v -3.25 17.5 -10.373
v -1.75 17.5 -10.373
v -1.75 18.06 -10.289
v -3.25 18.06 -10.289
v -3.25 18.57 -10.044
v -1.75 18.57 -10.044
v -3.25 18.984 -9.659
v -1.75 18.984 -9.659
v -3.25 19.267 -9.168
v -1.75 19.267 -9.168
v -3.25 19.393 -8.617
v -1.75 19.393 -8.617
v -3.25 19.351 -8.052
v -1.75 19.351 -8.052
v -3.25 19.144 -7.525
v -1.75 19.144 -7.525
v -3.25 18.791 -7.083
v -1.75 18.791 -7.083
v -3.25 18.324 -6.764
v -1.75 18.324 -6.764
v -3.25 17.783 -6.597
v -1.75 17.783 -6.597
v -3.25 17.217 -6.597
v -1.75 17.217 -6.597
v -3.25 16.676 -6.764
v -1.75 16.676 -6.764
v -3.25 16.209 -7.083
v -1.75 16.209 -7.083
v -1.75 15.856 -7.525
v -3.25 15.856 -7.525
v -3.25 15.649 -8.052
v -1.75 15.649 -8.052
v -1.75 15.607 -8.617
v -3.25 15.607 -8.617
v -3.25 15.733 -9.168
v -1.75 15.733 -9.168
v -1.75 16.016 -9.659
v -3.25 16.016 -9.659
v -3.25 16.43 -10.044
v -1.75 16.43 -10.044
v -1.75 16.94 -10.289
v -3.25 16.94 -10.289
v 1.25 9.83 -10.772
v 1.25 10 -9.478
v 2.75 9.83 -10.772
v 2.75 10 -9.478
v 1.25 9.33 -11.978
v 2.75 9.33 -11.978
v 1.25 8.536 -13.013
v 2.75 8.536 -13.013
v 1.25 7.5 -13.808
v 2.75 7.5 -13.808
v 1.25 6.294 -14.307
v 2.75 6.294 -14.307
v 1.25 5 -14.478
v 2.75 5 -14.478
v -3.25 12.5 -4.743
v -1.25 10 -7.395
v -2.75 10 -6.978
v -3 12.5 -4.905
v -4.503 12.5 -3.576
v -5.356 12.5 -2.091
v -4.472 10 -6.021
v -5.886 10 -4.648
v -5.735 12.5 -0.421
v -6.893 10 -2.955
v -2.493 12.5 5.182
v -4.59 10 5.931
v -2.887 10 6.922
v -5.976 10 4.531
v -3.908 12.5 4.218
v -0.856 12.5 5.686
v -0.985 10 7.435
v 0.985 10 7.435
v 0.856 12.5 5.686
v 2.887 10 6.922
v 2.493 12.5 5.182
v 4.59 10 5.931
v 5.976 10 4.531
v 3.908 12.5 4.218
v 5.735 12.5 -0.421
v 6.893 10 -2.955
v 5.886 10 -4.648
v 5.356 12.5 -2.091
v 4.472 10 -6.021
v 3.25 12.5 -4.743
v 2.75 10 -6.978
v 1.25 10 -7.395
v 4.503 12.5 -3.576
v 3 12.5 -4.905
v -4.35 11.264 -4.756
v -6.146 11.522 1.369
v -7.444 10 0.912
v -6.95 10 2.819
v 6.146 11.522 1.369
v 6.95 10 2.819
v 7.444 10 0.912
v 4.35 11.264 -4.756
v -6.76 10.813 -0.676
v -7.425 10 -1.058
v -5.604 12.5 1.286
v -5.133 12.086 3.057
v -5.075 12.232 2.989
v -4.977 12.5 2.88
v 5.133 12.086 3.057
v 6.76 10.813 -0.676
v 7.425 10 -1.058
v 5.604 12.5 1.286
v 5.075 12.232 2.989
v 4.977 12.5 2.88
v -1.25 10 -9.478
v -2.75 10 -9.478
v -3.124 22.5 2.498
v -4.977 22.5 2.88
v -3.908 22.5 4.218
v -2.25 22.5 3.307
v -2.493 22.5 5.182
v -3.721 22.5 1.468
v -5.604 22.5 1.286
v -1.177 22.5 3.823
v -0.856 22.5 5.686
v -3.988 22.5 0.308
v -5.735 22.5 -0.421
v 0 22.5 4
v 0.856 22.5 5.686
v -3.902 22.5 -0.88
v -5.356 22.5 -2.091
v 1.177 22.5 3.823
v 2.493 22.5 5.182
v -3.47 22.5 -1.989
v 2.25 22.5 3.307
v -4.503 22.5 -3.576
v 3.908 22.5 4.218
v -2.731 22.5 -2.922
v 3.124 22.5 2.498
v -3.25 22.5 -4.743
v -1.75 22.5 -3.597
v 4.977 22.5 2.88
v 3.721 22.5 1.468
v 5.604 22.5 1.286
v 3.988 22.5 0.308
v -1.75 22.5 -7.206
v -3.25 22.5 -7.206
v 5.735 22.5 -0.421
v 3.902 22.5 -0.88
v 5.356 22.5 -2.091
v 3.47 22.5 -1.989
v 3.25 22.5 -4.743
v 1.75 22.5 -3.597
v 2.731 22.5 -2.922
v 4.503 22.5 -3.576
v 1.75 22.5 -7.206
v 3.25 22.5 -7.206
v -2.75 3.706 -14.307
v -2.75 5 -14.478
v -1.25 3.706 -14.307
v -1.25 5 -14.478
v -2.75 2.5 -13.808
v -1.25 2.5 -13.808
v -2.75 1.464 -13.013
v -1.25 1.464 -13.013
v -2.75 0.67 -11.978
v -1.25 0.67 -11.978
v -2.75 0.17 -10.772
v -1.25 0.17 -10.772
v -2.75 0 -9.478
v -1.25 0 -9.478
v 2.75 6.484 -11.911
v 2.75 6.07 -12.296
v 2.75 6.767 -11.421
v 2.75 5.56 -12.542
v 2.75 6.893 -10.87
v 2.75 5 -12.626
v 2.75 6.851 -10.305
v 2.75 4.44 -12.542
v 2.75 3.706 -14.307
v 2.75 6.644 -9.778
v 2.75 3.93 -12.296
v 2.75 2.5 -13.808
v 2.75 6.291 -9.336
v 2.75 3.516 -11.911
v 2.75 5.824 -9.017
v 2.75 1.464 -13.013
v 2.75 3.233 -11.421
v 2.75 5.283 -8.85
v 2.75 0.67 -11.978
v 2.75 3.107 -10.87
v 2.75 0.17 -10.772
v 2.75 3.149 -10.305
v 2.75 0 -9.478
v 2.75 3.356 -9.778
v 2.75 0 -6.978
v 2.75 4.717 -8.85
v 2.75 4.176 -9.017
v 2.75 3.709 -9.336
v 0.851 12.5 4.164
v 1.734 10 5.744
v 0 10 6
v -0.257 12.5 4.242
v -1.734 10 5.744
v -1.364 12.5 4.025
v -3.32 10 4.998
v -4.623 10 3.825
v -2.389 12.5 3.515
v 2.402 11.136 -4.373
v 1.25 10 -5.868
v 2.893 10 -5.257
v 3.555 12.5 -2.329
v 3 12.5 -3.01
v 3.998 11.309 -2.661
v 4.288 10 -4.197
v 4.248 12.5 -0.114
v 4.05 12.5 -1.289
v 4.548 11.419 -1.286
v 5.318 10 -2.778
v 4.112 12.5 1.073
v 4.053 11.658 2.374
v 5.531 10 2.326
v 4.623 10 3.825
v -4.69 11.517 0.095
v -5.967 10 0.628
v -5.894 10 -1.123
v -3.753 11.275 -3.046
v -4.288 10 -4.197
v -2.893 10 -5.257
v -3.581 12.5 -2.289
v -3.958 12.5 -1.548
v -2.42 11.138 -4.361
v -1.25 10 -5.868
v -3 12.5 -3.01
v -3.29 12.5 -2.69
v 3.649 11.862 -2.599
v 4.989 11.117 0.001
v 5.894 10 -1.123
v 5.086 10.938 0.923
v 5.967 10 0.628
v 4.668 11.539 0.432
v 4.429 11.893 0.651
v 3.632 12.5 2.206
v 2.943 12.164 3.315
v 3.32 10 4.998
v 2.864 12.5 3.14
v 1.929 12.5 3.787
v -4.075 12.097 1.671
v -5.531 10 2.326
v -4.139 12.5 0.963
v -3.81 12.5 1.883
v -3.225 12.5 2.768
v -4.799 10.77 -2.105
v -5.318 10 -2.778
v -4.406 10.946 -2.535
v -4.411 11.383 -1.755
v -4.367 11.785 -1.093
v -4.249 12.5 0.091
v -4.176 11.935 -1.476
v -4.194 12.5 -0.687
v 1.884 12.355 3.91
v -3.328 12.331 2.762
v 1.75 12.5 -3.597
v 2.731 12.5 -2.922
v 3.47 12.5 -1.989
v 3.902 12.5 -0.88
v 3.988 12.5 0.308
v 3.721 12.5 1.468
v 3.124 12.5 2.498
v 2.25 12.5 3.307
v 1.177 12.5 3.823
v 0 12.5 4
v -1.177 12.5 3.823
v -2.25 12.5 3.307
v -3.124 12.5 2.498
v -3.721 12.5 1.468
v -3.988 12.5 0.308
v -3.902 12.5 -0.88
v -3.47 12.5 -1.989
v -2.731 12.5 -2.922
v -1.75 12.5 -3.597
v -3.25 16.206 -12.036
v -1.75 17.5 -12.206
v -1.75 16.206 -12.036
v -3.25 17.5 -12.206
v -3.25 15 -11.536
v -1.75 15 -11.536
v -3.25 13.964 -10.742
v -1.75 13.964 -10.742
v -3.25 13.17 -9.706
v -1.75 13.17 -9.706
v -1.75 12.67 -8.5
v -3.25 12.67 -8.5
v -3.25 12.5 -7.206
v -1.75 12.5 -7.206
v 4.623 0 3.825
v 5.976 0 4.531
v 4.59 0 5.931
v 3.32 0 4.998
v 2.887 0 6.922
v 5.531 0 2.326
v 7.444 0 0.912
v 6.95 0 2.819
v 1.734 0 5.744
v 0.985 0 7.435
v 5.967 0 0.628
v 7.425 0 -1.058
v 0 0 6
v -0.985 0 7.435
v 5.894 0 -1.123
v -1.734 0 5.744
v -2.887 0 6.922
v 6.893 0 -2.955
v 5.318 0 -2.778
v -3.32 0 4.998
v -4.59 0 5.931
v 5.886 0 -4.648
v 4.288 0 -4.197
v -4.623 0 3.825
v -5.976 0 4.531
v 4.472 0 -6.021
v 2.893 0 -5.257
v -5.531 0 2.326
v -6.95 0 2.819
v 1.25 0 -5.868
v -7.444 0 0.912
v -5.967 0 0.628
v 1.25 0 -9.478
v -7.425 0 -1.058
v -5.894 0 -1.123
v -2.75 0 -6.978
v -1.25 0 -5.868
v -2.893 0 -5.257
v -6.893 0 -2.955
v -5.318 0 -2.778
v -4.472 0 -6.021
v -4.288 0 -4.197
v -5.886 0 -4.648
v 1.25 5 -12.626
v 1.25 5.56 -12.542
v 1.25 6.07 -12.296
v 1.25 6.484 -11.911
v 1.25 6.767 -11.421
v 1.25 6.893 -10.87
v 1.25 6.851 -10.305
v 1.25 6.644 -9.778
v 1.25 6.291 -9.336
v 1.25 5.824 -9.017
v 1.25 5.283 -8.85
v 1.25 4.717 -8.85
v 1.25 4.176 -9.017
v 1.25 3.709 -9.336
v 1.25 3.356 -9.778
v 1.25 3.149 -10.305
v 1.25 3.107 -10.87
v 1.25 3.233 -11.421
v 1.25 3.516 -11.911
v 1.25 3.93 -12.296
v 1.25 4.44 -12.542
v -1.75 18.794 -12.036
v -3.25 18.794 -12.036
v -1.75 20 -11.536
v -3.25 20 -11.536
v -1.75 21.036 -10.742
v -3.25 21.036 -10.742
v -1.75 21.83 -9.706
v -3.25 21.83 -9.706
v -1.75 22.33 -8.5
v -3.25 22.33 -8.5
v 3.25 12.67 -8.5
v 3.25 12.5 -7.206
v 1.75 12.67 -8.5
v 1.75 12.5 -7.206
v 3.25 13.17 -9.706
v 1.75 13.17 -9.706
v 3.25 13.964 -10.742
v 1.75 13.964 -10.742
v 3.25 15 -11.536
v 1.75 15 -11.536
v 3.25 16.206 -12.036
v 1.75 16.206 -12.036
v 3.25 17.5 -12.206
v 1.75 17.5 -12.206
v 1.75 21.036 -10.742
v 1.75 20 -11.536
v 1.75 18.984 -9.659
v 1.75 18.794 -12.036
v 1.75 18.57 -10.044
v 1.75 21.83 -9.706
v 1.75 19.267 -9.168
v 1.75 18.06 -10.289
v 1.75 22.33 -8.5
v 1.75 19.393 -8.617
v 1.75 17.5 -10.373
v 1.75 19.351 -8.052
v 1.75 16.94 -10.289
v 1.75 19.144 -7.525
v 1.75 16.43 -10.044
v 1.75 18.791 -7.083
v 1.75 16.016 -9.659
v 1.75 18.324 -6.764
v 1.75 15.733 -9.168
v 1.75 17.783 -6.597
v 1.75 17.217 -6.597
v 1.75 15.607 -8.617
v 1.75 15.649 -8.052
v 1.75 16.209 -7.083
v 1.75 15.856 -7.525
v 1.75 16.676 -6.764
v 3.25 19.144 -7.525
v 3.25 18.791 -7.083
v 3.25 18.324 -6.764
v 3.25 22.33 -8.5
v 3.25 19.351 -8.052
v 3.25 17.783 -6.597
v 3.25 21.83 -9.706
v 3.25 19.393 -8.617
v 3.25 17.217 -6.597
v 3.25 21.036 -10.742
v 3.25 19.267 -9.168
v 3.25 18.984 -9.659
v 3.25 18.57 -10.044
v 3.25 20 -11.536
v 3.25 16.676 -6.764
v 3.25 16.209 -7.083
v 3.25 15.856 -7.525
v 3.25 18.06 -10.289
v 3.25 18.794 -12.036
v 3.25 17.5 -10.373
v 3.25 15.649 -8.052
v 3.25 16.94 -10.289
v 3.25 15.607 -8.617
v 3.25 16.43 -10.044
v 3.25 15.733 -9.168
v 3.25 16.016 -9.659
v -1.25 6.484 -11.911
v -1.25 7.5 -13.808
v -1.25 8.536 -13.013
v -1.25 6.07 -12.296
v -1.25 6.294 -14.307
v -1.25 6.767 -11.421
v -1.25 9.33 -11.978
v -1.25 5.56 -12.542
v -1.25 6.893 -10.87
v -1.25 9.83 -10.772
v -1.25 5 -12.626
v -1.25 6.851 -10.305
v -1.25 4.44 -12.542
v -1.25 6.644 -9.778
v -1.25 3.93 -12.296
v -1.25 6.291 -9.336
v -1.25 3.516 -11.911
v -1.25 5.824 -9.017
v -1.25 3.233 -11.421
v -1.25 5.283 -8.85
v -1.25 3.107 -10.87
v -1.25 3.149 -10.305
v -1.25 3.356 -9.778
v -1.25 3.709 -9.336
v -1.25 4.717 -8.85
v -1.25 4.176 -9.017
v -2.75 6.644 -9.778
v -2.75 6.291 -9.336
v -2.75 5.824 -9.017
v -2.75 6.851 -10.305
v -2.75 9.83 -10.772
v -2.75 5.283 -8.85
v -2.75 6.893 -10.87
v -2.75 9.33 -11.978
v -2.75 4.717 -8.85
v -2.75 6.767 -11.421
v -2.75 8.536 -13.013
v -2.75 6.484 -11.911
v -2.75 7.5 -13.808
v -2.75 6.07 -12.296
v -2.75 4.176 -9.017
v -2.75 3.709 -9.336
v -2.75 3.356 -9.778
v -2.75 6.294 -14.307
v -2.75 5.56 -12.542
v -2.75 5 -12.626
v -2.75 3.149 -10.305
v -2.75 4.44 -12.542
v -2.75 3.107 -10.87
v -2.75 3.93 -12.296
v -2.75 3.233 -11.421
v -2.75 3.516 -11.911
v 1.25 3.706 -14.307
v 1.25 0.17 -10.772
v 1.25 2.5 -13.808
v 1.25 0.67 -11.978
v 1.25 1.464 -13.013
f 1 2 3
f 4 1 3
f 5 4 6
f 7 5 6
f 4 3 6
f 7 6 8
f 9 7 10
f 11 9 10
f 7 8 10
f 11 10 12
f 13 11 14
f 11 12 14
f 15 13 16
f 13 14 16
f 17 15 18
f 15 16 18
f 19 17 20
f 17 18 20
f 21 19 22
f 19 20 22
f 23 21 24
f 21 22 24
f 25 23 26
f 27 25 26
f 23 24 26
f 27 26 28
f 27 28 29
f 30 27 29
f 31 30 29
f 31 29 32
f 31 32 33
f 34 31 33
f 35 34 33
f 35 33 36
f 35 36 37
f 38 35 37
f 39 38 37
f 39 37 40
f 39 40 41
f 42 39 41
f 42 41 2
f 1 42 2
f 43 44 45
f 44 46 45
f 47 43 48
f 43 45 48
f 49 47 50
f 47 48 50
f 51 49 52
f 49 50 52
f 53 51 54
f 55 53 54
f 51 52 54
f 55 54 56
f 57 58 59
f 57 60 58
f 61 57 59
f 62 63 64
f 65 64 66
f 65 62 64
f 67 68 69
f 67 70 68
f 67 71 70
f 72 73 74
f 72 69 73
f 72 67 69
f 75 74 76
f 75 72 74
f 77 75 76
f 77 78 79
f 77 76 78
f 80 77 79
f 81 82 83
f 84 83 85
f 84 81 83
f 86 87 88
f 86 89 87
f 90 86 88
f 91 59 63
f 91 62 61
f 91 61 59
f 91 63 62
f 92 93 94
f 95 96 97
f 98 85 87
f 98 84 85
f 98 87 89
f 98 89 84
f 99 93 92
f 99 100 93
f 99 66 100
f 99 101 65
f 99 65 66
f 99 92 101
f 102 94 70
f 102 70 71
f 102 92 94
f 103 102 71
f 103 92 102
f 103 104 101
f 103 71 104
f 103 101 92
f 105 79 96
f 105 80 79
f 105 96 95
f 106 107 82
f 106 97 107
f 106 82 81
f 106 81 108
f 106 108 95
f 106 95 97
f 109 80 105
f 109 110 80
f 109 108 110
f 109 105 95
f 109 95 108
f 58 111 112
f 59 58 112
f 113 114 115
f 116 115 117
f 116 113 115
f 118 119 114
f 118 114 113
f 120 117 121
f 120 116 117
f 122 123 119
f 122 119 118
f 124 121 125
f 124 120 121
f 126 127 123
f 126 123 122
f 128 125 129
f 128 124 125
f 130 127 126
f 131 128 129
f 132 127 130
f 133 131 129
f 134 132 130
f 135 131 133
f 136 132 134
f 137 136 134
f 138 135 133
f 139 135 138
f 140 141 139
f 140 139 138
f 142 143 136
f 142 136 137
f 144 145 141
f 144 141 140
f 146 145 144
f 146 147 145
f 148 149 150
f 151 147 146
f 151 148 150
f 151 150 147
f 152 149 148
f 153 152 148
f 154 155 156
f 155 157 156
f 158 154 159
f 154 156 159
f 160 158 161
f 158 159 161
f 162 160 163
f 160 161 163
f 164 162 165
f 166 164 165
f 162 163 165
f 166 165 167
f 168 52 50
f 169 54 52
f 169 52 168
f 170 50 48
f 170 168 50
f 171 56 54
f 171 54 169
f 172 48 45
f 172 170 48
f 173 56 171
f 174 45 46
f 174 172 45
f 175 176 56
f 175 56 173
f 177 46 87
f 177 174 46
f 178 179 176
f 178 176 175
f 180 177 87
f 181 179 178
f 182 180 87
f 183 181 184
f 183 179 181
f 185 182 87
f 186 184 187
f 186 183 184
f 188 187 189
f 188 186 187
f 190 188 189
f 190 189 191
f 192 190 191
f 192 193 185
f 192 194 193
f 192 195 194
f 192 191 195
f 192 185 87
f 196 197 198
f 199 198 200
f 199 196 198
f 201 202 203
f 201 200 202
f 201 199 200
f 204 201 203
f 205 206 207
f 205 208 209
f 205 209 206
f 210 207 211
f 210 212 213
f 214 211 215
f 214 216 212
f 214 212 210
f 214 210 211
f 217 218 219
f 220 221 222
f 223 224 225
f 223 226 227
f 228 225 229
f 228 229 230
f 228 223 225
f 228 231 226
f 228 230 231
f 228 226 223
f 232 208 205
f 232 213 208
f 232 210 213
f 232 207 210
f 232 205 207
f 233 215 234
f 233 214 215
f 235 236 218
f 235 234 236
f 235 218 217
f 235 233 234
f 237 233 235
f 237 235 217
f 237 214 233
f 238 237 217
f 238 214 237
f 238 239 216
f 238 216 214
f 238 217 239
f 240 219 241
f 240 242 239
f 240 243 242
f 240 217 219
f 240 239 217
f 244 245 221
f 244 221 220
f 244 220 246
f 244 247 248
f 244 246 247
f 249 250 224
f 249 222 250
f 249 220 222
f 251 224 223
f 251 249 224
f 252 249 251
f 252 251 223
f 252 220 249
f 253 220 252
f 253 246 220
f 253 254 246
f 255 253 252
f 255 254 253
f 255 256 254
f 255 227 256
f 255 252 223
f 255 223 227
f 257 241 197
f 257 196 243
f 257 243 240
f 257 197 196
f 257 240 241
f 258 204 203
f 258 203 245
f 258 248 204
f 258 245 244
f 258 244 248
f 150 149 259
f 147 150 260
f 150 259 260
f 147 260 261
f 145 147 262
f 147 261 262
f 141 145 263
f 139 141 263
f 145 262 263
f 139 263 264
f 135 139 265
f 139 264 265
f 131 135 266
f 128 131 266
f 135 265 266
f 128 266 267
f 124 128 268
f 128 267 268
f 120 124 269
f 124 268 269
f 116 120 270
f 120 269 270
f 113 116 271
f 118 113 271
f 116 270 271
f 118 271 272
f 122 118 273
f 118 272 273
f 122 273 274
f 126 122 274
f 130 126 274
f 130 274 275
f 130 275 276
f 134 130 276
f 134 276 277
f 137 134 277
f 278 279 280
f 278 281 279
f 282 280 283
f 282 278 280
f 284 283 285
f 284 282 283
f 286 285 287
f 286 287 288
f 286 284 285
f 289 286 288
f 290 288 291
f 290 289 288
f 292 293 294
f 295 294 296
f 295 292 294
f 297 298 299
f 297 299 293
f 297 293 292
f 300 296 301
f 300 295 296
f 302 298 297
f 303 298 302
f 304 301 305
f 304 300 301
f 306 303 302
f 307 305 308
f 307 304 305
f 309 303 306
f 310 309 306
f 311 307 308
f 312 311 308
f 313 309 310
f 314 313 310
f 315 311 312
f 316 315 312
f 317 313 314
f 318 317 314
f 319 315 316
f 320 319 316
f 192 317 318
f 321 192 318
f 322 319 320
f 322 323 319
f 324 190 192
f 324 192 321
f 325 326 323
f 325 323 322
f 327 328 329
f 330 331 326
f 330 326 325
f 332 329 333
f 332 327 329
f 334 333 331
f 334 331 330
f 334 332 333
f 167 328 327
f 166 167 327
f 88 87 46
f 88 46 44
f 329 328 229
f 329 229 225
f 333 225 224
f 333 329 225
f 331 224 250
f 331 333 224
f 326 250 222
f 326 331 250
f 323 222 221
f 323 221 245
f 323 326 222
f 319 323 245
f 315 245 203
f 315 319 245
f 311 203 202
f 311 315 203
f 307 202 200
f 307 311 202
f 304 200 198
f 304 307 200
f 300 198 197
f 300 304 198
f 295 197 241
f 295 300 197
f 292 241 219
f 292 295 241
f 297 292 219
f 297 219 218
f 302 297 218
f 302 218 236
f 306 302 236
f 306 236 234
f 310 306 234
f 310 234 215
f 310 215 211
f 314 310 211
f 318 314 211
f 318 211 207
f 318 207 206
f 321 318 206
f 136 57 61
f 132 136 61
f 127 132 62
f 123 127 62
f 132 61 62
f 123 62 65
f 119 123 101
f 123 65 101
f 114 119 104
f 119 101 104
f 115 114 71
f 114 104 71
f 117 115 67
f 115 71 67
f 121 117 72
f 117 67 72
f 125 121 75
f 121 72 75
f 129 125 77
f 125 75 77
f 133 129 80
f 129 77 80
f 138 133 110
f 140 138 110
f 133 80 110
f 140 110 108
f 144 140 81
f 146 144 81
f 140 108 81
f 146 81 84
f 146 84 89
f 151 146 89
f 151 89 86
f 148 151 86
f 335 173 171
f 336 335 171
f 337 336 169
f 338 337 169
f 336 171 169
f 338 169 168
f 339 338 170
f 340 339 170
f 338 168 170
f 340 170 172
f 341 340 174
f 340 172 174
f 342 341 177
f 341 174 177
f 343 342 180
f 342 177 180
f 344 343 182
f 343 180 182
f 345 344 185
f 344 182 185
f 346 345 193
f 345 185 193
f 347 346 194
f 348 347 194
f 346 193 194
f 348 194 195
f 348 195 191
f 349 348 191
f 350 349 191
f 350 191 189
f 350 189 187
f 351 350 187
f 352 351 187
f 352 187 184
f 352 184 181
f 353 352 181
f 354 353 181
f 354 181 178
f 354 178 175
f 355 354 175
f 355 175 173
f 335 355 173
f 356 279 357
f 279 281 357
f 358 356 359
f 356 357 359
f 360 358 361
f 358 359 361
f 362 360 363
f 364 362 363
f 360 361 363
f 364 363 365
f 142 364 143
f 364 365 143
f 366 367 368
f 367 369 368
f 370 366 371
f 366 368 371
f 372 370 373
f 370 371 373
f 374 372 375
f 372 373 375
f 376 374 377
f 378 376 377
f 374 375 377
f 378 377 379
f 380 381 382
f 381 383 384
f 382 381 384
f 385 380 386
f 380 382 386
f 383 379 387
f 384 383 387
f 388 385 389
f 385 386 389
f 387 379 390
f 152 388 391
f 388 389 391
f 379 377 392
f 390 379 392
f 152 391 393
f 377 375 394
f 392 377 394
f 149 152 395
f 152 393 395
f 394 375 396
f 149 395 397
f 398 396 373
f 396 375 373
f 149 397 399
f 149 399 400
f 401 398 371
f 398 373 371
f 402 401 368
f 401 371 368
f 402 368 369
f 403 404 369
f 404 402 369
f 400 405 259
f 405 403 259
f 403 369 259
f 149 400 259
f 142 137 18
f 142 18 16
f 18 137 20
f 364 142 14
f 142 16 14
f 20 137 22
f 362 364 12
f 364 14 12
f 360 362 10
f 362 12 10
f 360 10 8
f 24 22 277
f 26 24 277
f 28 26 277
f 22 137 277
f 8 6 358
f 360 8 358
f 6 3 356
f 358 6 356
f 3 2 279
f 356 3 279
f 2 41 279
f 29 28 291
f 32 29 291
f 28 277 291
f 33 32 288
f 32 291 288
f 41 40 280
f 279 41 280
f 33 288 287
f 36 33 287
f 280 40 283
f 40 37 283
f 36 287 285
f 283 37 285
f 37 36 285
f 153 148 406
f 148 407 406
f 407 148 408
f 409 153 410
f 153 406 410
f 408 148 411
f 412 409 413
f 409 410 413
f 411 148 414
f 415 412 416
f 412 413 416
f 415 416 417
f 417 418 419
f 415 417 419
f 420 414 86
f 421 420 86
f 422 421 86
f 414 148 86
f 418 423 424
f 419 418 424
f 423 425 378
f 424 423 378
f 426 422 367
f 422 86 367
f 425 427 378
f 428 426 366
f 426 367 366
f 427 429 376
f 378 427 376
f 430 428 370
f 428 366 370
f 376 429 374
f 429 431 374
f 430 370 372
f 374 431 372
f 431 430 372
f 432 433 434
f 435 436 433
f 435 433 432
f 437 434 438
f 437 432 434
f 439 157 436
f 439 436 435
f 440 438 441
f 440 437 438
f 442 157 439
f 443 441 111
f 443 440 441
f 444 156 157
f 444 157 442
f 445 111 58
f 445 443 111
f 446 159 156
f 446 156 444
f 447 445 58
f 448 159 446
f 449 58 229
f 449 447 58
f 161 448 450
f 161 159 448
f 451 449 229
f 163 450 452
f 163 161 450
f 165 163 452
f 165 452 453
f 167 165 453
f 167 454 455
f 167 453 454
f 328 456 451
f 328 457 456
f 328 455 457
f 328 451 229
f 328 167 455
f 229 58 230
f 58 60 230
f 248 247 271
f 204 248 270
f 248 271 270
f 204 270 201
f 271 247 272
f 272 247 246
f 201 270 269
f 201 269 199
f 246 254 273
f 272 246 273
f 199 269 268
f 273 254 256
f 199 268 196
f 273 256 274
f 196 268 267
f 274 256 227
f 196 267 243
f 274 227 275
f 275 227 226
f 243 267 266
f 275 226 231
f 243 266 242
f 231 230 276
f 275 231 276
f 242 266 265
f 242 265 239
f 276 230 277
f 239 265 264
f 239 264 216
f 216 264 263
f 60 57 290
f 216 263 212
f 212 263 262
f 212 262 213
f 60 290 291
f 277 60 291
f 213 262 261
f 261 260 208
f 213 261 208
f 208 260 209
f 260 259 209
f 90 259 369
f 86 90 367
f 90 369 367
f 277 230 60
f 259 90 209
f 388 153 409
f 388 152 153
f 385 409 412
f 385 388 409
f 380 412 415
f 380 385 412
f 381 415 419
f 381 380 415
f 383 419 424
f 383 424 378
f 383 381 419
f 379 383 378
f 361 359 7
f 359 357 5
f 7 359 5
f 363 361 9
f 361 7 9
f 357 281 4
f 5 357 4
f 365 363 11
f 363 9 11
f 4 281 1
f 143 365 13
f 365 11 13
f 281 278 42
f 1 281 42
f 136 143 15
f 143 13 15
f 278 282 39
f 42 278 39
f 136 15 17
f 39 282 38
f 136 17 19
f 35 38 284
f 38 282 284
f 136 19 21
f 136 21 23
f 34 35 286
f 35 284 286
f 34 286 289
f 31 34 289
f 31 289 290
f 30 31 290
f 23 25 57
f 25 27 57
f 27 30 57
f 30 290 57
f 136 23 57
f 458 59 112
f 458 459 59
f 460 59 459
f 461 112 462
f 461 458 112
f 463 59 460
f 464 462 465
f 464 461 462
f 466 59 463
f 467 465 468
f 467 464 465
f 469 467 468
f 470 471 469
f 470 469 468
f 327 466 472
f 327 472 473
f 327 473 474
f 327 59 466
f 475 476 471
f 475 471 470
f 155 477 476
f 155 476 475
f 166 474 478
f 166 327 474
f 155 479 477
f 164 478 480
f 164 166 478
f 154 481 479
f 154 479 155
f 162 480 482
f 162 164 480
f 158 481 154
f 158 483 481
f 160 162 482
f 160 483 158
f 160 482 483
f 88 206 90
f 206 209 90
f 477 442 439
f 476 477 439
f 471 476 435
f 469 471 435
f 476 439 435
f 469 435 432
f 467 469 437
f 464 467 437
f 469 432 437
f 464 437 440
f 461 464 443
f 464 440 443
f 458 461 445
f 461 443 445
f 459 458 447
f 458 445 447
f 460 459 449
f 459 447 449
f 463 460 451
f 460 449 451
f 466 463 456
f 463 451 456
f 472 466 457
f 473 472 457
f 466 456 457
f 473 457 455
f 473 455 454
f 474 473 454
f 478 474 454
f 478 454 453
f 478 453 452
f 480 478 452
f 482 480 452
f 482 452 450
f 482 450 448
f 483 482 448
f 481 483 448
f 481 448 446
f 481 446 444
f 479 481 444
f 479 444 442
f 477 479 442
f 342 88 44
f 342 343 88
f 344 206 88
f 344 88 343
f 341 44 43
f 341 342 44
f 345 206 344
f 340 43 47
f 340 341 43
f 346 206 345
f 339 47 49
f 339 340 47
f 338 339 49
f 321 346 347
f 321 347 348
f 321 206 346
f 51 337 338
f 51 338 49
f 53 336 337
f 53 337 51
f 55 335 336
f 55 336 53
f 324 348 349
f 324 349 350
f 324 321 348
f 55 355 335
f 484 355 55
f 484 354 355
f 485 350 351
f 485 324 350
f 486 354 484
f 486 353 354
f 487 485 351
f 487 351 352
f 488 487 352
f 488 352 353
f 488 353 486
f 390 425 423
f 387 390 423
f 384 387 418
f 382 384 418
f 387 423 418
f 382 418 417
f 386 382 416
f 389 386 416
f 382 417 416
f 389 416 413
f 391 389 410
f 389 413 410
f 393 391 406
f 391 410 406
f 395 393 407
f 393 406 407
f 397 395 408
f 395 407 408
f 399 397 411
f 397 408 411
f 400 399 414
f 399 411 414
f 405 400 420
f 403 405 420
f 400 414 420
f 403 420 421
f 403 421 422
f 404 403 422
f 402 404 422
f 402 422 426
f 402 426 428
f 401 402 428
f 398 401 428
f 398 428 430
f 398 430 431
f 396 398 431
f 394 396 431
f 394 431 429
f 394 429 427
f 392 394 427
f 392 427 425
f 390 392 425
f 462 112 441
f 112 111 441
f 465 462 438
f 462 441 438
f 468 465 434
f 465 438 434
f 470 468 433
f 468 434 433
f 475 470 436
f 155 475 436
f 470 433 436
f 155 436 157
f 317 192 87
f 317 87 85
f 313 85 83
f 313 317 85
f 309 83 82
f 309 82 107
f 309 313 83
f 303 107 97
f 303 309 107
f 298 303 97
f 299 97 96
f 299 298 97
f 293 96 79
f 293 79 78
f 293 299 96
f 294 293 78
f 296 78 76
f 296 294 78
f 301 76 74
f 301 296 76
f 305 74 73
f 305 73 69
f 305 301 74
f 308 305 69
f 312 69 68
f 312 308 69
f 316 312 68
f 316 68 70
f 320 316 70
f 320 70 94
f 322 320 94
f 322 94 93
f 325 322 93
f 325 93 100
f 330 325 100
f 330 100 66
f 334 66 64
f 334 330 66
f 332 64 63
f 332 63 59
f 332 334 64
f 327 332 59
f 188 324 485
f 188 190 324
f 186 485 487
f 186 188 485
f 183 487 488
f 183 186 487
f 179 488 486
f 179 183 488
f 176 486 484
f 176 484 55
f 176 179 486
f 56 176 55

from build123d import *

# Parameters (mm, degrees)
BOSS_EXTRUDE1_DEPTH   = 10
BOSS_EXTRUDE2_DEPTH   = 10
F_6_CLEARANCE_HOLE1_D = 3.7973
F_6_CLEARANCE_HOLE2_D = 3.7973
FILLET1_R             = 5


with BuildPart() as part:
    # Sketch1 → Boss-Extrude1 (new body)
    with BuildSketch(Plane(origin=(0, 0, 0), x_dir=(1, 0, 0), z_dir=(0, 1, 0))):
        with BuildLine():
            Line((-1.25, 14.477642868), (-1.25, 5.868347297))
            ThreePointArc((-1.25, 5.868347297), (0, -6), (1.25, 5.868347297))
            Line((1.25, 5.868347297), (1.25, 14.477642868))
            Line((1.25, 14.477642868), (2.75, 14.477642868))
            Line((2.75, 14.477642868), (2.75, 6.977642868))
            ThreePointArc((2.75, 6.977642868), (0, -7.5), (-2.75, 6.977642868))
            Line((-2.75, 6.977642868), (-2.75, 14.477642868))
            Line((-2.75, 14.477642868), (-1.25, 14.477642868))
        make_face()
    extrude(amount=BOSS_EXTRUDE1_DEPTH)

    # Loft1: read off the stored shape, not the designer's step
    # Loft1: loft between two sections, ruled curve by curve
    loft1_from = [
        Edge.make_bspline([(1.25, 10, -5.868347297), (10.900494926, 10, -3.812722767), (9.866997746, 10, 6), (-9.866997746, 10, 6), (-10.900494926, 10, -3.812722767), (-1.25, 10, -5.868347297)], [0, 0, 0, 0, 0.5, 0.5, 1, 1, 1, 1], 3, [1, 0.162539502, 0.065529731, 0.065529731, 0.162539502, 1]),
        Edge.make_bspline([(-1.25, 10, -7.395099729), (-13.876567029, 10, -5.260820359), (-12.805676217, 10, 7.5), (12.805676217, 10, 7.5), (13.876567029, 10, -5.260820359), (1.25, 10, -7.395099729)], [0, 0, 0, 0, 0.5, 0.5, 1, 1, 1, 1], 3, [1, 0.151386494, 0.058902089, 0.058902089, 0.151386494, 1]),
        Edge.make_line((-1.25, 10, -7.395099729), (-1.25, 10, -5.868347297)),
        Edge.make_line((1.25, 10, -5.868347297), (1.25, 10, -7.395099729)),
    ]
    loft1_to = [
        Edge.make_bspline([(3, 12.5, -3.010398645), (6.15488313, 12.5, 0.133586757), (4.453979318, 12.5, 4.25), (-4.453979318, 12.5, 4.25), (-6.15488313, 12.5, 0.133586757), (-3, 12.5, -3.010398645)], [0, 0, 0, 0, 0.5, 0.5, 1, 1, 1, 1], 3, [1, 0.345653128, 0.203217328, 0.203217328, 0.345653128, 1]),
        Edge.make_bspline([(-3, 12.5, -4.905354218), (-9.124128689, 12.5, -1.159980234), (-7.178633469, 12.5, 5.75), (7.178633469, 12.5, 5.75), (9.124128689, 12.5, -1.159980234), (3, 12.5, -4.905354218)], [0, 0, 0, 0, 0.5, 0.5, 1, 1, 1, 1], 3, [1, 0.264204167, 0.135803041, 0.135803041, 0.264204167, 1]),
        Edge.make_line((-3, 12.5, -4.905354218), (-3, 12.5, -3.010398645)),
        Edge.make_line((3, 12.5, -3.010398645), (3, 12.5, -4.905354218)),
    ]
    loft1 = Solid(Shell([*[Face.make_surface_from_curves(loft1_from[k], loft1_to[k]) for k in range(4)], Face(Wire(loft1_from)), Face(Wire(loft1_to))]))
    add(loft1)

    # Sketch4 → Boss-Extrude2 (add)
    with BuildSketch(Plane(origin=(0, 12.5, 0), x_dir=(1, 0, 0), z_dir=(0, 1, 0))):
        with BuildLine():
            Line((-1.75, 5.123626074), (-1.75, 12.206169214))
            Line((-1.75, 12.206169214), (-3.25, 12.206169214))
            Line((-3.25, 12.206169214), (-3.25, 4.74341649))
            ThreePointArc((-3.25, 4.74341649), (0, -5.75), (3.25, 4.74341649))
            Line((3.25, 4.74341649), (3.25, 12.206169214))
            Line((3.25, 12.206169214), (1.75, 12.206169214))
            Line((1.75, 12.206169214), (1.75, 5.123626074))
            Line((1.75, 5.123626074), (1.75, 3.596873642))
            ThreePointArc((1.75, 3.596873642), (0, -4), (-1.75, 3.596873642))
            Line((-1.75, 3.596873642), (-1.75, 5.123626074))
        make_face()
    extrude(amount=BOSS_EXTRUDE2_DEPTH)

    # #6 Clearance Hole1 (through all)
    with Locations(Plane.ZY.offset(2.75)):
        with Locations((-10.727642082, 5)):
            Hole(F_6_CLEARANCE_HOLE1_D / 2)

    # #6 Clearance Hole2 (through all)
    with Locations(Plane.ZY.offset(3.25)):
        with Locations((-8.474792852, 17.5)):
            Hole(F_6_CLEARANCE_HOLE2_D / 2)

    # Fillet1
    fillet1_edges = [part.edges().sort_by_distance(p)[0] for p in [
        (2, 0, -14.477642868),
        (-2, 0, -14.477642868),
        (-2.5, 12.5, -12.206169214),
        (2.5, 12.5, -12.206169214),
        (-2.5, 22.5, -12.206169214),
        (2.5, 22.5, -12.206169214),
        (2, 10, -14.477642868),
        (-2, 10, -14.477642868),
    ]]
    fillet(fillet1_edges, radius=FILLET1_R - 0.0001)  # a hair under: the kernel refuses the full size


solid = part.part
